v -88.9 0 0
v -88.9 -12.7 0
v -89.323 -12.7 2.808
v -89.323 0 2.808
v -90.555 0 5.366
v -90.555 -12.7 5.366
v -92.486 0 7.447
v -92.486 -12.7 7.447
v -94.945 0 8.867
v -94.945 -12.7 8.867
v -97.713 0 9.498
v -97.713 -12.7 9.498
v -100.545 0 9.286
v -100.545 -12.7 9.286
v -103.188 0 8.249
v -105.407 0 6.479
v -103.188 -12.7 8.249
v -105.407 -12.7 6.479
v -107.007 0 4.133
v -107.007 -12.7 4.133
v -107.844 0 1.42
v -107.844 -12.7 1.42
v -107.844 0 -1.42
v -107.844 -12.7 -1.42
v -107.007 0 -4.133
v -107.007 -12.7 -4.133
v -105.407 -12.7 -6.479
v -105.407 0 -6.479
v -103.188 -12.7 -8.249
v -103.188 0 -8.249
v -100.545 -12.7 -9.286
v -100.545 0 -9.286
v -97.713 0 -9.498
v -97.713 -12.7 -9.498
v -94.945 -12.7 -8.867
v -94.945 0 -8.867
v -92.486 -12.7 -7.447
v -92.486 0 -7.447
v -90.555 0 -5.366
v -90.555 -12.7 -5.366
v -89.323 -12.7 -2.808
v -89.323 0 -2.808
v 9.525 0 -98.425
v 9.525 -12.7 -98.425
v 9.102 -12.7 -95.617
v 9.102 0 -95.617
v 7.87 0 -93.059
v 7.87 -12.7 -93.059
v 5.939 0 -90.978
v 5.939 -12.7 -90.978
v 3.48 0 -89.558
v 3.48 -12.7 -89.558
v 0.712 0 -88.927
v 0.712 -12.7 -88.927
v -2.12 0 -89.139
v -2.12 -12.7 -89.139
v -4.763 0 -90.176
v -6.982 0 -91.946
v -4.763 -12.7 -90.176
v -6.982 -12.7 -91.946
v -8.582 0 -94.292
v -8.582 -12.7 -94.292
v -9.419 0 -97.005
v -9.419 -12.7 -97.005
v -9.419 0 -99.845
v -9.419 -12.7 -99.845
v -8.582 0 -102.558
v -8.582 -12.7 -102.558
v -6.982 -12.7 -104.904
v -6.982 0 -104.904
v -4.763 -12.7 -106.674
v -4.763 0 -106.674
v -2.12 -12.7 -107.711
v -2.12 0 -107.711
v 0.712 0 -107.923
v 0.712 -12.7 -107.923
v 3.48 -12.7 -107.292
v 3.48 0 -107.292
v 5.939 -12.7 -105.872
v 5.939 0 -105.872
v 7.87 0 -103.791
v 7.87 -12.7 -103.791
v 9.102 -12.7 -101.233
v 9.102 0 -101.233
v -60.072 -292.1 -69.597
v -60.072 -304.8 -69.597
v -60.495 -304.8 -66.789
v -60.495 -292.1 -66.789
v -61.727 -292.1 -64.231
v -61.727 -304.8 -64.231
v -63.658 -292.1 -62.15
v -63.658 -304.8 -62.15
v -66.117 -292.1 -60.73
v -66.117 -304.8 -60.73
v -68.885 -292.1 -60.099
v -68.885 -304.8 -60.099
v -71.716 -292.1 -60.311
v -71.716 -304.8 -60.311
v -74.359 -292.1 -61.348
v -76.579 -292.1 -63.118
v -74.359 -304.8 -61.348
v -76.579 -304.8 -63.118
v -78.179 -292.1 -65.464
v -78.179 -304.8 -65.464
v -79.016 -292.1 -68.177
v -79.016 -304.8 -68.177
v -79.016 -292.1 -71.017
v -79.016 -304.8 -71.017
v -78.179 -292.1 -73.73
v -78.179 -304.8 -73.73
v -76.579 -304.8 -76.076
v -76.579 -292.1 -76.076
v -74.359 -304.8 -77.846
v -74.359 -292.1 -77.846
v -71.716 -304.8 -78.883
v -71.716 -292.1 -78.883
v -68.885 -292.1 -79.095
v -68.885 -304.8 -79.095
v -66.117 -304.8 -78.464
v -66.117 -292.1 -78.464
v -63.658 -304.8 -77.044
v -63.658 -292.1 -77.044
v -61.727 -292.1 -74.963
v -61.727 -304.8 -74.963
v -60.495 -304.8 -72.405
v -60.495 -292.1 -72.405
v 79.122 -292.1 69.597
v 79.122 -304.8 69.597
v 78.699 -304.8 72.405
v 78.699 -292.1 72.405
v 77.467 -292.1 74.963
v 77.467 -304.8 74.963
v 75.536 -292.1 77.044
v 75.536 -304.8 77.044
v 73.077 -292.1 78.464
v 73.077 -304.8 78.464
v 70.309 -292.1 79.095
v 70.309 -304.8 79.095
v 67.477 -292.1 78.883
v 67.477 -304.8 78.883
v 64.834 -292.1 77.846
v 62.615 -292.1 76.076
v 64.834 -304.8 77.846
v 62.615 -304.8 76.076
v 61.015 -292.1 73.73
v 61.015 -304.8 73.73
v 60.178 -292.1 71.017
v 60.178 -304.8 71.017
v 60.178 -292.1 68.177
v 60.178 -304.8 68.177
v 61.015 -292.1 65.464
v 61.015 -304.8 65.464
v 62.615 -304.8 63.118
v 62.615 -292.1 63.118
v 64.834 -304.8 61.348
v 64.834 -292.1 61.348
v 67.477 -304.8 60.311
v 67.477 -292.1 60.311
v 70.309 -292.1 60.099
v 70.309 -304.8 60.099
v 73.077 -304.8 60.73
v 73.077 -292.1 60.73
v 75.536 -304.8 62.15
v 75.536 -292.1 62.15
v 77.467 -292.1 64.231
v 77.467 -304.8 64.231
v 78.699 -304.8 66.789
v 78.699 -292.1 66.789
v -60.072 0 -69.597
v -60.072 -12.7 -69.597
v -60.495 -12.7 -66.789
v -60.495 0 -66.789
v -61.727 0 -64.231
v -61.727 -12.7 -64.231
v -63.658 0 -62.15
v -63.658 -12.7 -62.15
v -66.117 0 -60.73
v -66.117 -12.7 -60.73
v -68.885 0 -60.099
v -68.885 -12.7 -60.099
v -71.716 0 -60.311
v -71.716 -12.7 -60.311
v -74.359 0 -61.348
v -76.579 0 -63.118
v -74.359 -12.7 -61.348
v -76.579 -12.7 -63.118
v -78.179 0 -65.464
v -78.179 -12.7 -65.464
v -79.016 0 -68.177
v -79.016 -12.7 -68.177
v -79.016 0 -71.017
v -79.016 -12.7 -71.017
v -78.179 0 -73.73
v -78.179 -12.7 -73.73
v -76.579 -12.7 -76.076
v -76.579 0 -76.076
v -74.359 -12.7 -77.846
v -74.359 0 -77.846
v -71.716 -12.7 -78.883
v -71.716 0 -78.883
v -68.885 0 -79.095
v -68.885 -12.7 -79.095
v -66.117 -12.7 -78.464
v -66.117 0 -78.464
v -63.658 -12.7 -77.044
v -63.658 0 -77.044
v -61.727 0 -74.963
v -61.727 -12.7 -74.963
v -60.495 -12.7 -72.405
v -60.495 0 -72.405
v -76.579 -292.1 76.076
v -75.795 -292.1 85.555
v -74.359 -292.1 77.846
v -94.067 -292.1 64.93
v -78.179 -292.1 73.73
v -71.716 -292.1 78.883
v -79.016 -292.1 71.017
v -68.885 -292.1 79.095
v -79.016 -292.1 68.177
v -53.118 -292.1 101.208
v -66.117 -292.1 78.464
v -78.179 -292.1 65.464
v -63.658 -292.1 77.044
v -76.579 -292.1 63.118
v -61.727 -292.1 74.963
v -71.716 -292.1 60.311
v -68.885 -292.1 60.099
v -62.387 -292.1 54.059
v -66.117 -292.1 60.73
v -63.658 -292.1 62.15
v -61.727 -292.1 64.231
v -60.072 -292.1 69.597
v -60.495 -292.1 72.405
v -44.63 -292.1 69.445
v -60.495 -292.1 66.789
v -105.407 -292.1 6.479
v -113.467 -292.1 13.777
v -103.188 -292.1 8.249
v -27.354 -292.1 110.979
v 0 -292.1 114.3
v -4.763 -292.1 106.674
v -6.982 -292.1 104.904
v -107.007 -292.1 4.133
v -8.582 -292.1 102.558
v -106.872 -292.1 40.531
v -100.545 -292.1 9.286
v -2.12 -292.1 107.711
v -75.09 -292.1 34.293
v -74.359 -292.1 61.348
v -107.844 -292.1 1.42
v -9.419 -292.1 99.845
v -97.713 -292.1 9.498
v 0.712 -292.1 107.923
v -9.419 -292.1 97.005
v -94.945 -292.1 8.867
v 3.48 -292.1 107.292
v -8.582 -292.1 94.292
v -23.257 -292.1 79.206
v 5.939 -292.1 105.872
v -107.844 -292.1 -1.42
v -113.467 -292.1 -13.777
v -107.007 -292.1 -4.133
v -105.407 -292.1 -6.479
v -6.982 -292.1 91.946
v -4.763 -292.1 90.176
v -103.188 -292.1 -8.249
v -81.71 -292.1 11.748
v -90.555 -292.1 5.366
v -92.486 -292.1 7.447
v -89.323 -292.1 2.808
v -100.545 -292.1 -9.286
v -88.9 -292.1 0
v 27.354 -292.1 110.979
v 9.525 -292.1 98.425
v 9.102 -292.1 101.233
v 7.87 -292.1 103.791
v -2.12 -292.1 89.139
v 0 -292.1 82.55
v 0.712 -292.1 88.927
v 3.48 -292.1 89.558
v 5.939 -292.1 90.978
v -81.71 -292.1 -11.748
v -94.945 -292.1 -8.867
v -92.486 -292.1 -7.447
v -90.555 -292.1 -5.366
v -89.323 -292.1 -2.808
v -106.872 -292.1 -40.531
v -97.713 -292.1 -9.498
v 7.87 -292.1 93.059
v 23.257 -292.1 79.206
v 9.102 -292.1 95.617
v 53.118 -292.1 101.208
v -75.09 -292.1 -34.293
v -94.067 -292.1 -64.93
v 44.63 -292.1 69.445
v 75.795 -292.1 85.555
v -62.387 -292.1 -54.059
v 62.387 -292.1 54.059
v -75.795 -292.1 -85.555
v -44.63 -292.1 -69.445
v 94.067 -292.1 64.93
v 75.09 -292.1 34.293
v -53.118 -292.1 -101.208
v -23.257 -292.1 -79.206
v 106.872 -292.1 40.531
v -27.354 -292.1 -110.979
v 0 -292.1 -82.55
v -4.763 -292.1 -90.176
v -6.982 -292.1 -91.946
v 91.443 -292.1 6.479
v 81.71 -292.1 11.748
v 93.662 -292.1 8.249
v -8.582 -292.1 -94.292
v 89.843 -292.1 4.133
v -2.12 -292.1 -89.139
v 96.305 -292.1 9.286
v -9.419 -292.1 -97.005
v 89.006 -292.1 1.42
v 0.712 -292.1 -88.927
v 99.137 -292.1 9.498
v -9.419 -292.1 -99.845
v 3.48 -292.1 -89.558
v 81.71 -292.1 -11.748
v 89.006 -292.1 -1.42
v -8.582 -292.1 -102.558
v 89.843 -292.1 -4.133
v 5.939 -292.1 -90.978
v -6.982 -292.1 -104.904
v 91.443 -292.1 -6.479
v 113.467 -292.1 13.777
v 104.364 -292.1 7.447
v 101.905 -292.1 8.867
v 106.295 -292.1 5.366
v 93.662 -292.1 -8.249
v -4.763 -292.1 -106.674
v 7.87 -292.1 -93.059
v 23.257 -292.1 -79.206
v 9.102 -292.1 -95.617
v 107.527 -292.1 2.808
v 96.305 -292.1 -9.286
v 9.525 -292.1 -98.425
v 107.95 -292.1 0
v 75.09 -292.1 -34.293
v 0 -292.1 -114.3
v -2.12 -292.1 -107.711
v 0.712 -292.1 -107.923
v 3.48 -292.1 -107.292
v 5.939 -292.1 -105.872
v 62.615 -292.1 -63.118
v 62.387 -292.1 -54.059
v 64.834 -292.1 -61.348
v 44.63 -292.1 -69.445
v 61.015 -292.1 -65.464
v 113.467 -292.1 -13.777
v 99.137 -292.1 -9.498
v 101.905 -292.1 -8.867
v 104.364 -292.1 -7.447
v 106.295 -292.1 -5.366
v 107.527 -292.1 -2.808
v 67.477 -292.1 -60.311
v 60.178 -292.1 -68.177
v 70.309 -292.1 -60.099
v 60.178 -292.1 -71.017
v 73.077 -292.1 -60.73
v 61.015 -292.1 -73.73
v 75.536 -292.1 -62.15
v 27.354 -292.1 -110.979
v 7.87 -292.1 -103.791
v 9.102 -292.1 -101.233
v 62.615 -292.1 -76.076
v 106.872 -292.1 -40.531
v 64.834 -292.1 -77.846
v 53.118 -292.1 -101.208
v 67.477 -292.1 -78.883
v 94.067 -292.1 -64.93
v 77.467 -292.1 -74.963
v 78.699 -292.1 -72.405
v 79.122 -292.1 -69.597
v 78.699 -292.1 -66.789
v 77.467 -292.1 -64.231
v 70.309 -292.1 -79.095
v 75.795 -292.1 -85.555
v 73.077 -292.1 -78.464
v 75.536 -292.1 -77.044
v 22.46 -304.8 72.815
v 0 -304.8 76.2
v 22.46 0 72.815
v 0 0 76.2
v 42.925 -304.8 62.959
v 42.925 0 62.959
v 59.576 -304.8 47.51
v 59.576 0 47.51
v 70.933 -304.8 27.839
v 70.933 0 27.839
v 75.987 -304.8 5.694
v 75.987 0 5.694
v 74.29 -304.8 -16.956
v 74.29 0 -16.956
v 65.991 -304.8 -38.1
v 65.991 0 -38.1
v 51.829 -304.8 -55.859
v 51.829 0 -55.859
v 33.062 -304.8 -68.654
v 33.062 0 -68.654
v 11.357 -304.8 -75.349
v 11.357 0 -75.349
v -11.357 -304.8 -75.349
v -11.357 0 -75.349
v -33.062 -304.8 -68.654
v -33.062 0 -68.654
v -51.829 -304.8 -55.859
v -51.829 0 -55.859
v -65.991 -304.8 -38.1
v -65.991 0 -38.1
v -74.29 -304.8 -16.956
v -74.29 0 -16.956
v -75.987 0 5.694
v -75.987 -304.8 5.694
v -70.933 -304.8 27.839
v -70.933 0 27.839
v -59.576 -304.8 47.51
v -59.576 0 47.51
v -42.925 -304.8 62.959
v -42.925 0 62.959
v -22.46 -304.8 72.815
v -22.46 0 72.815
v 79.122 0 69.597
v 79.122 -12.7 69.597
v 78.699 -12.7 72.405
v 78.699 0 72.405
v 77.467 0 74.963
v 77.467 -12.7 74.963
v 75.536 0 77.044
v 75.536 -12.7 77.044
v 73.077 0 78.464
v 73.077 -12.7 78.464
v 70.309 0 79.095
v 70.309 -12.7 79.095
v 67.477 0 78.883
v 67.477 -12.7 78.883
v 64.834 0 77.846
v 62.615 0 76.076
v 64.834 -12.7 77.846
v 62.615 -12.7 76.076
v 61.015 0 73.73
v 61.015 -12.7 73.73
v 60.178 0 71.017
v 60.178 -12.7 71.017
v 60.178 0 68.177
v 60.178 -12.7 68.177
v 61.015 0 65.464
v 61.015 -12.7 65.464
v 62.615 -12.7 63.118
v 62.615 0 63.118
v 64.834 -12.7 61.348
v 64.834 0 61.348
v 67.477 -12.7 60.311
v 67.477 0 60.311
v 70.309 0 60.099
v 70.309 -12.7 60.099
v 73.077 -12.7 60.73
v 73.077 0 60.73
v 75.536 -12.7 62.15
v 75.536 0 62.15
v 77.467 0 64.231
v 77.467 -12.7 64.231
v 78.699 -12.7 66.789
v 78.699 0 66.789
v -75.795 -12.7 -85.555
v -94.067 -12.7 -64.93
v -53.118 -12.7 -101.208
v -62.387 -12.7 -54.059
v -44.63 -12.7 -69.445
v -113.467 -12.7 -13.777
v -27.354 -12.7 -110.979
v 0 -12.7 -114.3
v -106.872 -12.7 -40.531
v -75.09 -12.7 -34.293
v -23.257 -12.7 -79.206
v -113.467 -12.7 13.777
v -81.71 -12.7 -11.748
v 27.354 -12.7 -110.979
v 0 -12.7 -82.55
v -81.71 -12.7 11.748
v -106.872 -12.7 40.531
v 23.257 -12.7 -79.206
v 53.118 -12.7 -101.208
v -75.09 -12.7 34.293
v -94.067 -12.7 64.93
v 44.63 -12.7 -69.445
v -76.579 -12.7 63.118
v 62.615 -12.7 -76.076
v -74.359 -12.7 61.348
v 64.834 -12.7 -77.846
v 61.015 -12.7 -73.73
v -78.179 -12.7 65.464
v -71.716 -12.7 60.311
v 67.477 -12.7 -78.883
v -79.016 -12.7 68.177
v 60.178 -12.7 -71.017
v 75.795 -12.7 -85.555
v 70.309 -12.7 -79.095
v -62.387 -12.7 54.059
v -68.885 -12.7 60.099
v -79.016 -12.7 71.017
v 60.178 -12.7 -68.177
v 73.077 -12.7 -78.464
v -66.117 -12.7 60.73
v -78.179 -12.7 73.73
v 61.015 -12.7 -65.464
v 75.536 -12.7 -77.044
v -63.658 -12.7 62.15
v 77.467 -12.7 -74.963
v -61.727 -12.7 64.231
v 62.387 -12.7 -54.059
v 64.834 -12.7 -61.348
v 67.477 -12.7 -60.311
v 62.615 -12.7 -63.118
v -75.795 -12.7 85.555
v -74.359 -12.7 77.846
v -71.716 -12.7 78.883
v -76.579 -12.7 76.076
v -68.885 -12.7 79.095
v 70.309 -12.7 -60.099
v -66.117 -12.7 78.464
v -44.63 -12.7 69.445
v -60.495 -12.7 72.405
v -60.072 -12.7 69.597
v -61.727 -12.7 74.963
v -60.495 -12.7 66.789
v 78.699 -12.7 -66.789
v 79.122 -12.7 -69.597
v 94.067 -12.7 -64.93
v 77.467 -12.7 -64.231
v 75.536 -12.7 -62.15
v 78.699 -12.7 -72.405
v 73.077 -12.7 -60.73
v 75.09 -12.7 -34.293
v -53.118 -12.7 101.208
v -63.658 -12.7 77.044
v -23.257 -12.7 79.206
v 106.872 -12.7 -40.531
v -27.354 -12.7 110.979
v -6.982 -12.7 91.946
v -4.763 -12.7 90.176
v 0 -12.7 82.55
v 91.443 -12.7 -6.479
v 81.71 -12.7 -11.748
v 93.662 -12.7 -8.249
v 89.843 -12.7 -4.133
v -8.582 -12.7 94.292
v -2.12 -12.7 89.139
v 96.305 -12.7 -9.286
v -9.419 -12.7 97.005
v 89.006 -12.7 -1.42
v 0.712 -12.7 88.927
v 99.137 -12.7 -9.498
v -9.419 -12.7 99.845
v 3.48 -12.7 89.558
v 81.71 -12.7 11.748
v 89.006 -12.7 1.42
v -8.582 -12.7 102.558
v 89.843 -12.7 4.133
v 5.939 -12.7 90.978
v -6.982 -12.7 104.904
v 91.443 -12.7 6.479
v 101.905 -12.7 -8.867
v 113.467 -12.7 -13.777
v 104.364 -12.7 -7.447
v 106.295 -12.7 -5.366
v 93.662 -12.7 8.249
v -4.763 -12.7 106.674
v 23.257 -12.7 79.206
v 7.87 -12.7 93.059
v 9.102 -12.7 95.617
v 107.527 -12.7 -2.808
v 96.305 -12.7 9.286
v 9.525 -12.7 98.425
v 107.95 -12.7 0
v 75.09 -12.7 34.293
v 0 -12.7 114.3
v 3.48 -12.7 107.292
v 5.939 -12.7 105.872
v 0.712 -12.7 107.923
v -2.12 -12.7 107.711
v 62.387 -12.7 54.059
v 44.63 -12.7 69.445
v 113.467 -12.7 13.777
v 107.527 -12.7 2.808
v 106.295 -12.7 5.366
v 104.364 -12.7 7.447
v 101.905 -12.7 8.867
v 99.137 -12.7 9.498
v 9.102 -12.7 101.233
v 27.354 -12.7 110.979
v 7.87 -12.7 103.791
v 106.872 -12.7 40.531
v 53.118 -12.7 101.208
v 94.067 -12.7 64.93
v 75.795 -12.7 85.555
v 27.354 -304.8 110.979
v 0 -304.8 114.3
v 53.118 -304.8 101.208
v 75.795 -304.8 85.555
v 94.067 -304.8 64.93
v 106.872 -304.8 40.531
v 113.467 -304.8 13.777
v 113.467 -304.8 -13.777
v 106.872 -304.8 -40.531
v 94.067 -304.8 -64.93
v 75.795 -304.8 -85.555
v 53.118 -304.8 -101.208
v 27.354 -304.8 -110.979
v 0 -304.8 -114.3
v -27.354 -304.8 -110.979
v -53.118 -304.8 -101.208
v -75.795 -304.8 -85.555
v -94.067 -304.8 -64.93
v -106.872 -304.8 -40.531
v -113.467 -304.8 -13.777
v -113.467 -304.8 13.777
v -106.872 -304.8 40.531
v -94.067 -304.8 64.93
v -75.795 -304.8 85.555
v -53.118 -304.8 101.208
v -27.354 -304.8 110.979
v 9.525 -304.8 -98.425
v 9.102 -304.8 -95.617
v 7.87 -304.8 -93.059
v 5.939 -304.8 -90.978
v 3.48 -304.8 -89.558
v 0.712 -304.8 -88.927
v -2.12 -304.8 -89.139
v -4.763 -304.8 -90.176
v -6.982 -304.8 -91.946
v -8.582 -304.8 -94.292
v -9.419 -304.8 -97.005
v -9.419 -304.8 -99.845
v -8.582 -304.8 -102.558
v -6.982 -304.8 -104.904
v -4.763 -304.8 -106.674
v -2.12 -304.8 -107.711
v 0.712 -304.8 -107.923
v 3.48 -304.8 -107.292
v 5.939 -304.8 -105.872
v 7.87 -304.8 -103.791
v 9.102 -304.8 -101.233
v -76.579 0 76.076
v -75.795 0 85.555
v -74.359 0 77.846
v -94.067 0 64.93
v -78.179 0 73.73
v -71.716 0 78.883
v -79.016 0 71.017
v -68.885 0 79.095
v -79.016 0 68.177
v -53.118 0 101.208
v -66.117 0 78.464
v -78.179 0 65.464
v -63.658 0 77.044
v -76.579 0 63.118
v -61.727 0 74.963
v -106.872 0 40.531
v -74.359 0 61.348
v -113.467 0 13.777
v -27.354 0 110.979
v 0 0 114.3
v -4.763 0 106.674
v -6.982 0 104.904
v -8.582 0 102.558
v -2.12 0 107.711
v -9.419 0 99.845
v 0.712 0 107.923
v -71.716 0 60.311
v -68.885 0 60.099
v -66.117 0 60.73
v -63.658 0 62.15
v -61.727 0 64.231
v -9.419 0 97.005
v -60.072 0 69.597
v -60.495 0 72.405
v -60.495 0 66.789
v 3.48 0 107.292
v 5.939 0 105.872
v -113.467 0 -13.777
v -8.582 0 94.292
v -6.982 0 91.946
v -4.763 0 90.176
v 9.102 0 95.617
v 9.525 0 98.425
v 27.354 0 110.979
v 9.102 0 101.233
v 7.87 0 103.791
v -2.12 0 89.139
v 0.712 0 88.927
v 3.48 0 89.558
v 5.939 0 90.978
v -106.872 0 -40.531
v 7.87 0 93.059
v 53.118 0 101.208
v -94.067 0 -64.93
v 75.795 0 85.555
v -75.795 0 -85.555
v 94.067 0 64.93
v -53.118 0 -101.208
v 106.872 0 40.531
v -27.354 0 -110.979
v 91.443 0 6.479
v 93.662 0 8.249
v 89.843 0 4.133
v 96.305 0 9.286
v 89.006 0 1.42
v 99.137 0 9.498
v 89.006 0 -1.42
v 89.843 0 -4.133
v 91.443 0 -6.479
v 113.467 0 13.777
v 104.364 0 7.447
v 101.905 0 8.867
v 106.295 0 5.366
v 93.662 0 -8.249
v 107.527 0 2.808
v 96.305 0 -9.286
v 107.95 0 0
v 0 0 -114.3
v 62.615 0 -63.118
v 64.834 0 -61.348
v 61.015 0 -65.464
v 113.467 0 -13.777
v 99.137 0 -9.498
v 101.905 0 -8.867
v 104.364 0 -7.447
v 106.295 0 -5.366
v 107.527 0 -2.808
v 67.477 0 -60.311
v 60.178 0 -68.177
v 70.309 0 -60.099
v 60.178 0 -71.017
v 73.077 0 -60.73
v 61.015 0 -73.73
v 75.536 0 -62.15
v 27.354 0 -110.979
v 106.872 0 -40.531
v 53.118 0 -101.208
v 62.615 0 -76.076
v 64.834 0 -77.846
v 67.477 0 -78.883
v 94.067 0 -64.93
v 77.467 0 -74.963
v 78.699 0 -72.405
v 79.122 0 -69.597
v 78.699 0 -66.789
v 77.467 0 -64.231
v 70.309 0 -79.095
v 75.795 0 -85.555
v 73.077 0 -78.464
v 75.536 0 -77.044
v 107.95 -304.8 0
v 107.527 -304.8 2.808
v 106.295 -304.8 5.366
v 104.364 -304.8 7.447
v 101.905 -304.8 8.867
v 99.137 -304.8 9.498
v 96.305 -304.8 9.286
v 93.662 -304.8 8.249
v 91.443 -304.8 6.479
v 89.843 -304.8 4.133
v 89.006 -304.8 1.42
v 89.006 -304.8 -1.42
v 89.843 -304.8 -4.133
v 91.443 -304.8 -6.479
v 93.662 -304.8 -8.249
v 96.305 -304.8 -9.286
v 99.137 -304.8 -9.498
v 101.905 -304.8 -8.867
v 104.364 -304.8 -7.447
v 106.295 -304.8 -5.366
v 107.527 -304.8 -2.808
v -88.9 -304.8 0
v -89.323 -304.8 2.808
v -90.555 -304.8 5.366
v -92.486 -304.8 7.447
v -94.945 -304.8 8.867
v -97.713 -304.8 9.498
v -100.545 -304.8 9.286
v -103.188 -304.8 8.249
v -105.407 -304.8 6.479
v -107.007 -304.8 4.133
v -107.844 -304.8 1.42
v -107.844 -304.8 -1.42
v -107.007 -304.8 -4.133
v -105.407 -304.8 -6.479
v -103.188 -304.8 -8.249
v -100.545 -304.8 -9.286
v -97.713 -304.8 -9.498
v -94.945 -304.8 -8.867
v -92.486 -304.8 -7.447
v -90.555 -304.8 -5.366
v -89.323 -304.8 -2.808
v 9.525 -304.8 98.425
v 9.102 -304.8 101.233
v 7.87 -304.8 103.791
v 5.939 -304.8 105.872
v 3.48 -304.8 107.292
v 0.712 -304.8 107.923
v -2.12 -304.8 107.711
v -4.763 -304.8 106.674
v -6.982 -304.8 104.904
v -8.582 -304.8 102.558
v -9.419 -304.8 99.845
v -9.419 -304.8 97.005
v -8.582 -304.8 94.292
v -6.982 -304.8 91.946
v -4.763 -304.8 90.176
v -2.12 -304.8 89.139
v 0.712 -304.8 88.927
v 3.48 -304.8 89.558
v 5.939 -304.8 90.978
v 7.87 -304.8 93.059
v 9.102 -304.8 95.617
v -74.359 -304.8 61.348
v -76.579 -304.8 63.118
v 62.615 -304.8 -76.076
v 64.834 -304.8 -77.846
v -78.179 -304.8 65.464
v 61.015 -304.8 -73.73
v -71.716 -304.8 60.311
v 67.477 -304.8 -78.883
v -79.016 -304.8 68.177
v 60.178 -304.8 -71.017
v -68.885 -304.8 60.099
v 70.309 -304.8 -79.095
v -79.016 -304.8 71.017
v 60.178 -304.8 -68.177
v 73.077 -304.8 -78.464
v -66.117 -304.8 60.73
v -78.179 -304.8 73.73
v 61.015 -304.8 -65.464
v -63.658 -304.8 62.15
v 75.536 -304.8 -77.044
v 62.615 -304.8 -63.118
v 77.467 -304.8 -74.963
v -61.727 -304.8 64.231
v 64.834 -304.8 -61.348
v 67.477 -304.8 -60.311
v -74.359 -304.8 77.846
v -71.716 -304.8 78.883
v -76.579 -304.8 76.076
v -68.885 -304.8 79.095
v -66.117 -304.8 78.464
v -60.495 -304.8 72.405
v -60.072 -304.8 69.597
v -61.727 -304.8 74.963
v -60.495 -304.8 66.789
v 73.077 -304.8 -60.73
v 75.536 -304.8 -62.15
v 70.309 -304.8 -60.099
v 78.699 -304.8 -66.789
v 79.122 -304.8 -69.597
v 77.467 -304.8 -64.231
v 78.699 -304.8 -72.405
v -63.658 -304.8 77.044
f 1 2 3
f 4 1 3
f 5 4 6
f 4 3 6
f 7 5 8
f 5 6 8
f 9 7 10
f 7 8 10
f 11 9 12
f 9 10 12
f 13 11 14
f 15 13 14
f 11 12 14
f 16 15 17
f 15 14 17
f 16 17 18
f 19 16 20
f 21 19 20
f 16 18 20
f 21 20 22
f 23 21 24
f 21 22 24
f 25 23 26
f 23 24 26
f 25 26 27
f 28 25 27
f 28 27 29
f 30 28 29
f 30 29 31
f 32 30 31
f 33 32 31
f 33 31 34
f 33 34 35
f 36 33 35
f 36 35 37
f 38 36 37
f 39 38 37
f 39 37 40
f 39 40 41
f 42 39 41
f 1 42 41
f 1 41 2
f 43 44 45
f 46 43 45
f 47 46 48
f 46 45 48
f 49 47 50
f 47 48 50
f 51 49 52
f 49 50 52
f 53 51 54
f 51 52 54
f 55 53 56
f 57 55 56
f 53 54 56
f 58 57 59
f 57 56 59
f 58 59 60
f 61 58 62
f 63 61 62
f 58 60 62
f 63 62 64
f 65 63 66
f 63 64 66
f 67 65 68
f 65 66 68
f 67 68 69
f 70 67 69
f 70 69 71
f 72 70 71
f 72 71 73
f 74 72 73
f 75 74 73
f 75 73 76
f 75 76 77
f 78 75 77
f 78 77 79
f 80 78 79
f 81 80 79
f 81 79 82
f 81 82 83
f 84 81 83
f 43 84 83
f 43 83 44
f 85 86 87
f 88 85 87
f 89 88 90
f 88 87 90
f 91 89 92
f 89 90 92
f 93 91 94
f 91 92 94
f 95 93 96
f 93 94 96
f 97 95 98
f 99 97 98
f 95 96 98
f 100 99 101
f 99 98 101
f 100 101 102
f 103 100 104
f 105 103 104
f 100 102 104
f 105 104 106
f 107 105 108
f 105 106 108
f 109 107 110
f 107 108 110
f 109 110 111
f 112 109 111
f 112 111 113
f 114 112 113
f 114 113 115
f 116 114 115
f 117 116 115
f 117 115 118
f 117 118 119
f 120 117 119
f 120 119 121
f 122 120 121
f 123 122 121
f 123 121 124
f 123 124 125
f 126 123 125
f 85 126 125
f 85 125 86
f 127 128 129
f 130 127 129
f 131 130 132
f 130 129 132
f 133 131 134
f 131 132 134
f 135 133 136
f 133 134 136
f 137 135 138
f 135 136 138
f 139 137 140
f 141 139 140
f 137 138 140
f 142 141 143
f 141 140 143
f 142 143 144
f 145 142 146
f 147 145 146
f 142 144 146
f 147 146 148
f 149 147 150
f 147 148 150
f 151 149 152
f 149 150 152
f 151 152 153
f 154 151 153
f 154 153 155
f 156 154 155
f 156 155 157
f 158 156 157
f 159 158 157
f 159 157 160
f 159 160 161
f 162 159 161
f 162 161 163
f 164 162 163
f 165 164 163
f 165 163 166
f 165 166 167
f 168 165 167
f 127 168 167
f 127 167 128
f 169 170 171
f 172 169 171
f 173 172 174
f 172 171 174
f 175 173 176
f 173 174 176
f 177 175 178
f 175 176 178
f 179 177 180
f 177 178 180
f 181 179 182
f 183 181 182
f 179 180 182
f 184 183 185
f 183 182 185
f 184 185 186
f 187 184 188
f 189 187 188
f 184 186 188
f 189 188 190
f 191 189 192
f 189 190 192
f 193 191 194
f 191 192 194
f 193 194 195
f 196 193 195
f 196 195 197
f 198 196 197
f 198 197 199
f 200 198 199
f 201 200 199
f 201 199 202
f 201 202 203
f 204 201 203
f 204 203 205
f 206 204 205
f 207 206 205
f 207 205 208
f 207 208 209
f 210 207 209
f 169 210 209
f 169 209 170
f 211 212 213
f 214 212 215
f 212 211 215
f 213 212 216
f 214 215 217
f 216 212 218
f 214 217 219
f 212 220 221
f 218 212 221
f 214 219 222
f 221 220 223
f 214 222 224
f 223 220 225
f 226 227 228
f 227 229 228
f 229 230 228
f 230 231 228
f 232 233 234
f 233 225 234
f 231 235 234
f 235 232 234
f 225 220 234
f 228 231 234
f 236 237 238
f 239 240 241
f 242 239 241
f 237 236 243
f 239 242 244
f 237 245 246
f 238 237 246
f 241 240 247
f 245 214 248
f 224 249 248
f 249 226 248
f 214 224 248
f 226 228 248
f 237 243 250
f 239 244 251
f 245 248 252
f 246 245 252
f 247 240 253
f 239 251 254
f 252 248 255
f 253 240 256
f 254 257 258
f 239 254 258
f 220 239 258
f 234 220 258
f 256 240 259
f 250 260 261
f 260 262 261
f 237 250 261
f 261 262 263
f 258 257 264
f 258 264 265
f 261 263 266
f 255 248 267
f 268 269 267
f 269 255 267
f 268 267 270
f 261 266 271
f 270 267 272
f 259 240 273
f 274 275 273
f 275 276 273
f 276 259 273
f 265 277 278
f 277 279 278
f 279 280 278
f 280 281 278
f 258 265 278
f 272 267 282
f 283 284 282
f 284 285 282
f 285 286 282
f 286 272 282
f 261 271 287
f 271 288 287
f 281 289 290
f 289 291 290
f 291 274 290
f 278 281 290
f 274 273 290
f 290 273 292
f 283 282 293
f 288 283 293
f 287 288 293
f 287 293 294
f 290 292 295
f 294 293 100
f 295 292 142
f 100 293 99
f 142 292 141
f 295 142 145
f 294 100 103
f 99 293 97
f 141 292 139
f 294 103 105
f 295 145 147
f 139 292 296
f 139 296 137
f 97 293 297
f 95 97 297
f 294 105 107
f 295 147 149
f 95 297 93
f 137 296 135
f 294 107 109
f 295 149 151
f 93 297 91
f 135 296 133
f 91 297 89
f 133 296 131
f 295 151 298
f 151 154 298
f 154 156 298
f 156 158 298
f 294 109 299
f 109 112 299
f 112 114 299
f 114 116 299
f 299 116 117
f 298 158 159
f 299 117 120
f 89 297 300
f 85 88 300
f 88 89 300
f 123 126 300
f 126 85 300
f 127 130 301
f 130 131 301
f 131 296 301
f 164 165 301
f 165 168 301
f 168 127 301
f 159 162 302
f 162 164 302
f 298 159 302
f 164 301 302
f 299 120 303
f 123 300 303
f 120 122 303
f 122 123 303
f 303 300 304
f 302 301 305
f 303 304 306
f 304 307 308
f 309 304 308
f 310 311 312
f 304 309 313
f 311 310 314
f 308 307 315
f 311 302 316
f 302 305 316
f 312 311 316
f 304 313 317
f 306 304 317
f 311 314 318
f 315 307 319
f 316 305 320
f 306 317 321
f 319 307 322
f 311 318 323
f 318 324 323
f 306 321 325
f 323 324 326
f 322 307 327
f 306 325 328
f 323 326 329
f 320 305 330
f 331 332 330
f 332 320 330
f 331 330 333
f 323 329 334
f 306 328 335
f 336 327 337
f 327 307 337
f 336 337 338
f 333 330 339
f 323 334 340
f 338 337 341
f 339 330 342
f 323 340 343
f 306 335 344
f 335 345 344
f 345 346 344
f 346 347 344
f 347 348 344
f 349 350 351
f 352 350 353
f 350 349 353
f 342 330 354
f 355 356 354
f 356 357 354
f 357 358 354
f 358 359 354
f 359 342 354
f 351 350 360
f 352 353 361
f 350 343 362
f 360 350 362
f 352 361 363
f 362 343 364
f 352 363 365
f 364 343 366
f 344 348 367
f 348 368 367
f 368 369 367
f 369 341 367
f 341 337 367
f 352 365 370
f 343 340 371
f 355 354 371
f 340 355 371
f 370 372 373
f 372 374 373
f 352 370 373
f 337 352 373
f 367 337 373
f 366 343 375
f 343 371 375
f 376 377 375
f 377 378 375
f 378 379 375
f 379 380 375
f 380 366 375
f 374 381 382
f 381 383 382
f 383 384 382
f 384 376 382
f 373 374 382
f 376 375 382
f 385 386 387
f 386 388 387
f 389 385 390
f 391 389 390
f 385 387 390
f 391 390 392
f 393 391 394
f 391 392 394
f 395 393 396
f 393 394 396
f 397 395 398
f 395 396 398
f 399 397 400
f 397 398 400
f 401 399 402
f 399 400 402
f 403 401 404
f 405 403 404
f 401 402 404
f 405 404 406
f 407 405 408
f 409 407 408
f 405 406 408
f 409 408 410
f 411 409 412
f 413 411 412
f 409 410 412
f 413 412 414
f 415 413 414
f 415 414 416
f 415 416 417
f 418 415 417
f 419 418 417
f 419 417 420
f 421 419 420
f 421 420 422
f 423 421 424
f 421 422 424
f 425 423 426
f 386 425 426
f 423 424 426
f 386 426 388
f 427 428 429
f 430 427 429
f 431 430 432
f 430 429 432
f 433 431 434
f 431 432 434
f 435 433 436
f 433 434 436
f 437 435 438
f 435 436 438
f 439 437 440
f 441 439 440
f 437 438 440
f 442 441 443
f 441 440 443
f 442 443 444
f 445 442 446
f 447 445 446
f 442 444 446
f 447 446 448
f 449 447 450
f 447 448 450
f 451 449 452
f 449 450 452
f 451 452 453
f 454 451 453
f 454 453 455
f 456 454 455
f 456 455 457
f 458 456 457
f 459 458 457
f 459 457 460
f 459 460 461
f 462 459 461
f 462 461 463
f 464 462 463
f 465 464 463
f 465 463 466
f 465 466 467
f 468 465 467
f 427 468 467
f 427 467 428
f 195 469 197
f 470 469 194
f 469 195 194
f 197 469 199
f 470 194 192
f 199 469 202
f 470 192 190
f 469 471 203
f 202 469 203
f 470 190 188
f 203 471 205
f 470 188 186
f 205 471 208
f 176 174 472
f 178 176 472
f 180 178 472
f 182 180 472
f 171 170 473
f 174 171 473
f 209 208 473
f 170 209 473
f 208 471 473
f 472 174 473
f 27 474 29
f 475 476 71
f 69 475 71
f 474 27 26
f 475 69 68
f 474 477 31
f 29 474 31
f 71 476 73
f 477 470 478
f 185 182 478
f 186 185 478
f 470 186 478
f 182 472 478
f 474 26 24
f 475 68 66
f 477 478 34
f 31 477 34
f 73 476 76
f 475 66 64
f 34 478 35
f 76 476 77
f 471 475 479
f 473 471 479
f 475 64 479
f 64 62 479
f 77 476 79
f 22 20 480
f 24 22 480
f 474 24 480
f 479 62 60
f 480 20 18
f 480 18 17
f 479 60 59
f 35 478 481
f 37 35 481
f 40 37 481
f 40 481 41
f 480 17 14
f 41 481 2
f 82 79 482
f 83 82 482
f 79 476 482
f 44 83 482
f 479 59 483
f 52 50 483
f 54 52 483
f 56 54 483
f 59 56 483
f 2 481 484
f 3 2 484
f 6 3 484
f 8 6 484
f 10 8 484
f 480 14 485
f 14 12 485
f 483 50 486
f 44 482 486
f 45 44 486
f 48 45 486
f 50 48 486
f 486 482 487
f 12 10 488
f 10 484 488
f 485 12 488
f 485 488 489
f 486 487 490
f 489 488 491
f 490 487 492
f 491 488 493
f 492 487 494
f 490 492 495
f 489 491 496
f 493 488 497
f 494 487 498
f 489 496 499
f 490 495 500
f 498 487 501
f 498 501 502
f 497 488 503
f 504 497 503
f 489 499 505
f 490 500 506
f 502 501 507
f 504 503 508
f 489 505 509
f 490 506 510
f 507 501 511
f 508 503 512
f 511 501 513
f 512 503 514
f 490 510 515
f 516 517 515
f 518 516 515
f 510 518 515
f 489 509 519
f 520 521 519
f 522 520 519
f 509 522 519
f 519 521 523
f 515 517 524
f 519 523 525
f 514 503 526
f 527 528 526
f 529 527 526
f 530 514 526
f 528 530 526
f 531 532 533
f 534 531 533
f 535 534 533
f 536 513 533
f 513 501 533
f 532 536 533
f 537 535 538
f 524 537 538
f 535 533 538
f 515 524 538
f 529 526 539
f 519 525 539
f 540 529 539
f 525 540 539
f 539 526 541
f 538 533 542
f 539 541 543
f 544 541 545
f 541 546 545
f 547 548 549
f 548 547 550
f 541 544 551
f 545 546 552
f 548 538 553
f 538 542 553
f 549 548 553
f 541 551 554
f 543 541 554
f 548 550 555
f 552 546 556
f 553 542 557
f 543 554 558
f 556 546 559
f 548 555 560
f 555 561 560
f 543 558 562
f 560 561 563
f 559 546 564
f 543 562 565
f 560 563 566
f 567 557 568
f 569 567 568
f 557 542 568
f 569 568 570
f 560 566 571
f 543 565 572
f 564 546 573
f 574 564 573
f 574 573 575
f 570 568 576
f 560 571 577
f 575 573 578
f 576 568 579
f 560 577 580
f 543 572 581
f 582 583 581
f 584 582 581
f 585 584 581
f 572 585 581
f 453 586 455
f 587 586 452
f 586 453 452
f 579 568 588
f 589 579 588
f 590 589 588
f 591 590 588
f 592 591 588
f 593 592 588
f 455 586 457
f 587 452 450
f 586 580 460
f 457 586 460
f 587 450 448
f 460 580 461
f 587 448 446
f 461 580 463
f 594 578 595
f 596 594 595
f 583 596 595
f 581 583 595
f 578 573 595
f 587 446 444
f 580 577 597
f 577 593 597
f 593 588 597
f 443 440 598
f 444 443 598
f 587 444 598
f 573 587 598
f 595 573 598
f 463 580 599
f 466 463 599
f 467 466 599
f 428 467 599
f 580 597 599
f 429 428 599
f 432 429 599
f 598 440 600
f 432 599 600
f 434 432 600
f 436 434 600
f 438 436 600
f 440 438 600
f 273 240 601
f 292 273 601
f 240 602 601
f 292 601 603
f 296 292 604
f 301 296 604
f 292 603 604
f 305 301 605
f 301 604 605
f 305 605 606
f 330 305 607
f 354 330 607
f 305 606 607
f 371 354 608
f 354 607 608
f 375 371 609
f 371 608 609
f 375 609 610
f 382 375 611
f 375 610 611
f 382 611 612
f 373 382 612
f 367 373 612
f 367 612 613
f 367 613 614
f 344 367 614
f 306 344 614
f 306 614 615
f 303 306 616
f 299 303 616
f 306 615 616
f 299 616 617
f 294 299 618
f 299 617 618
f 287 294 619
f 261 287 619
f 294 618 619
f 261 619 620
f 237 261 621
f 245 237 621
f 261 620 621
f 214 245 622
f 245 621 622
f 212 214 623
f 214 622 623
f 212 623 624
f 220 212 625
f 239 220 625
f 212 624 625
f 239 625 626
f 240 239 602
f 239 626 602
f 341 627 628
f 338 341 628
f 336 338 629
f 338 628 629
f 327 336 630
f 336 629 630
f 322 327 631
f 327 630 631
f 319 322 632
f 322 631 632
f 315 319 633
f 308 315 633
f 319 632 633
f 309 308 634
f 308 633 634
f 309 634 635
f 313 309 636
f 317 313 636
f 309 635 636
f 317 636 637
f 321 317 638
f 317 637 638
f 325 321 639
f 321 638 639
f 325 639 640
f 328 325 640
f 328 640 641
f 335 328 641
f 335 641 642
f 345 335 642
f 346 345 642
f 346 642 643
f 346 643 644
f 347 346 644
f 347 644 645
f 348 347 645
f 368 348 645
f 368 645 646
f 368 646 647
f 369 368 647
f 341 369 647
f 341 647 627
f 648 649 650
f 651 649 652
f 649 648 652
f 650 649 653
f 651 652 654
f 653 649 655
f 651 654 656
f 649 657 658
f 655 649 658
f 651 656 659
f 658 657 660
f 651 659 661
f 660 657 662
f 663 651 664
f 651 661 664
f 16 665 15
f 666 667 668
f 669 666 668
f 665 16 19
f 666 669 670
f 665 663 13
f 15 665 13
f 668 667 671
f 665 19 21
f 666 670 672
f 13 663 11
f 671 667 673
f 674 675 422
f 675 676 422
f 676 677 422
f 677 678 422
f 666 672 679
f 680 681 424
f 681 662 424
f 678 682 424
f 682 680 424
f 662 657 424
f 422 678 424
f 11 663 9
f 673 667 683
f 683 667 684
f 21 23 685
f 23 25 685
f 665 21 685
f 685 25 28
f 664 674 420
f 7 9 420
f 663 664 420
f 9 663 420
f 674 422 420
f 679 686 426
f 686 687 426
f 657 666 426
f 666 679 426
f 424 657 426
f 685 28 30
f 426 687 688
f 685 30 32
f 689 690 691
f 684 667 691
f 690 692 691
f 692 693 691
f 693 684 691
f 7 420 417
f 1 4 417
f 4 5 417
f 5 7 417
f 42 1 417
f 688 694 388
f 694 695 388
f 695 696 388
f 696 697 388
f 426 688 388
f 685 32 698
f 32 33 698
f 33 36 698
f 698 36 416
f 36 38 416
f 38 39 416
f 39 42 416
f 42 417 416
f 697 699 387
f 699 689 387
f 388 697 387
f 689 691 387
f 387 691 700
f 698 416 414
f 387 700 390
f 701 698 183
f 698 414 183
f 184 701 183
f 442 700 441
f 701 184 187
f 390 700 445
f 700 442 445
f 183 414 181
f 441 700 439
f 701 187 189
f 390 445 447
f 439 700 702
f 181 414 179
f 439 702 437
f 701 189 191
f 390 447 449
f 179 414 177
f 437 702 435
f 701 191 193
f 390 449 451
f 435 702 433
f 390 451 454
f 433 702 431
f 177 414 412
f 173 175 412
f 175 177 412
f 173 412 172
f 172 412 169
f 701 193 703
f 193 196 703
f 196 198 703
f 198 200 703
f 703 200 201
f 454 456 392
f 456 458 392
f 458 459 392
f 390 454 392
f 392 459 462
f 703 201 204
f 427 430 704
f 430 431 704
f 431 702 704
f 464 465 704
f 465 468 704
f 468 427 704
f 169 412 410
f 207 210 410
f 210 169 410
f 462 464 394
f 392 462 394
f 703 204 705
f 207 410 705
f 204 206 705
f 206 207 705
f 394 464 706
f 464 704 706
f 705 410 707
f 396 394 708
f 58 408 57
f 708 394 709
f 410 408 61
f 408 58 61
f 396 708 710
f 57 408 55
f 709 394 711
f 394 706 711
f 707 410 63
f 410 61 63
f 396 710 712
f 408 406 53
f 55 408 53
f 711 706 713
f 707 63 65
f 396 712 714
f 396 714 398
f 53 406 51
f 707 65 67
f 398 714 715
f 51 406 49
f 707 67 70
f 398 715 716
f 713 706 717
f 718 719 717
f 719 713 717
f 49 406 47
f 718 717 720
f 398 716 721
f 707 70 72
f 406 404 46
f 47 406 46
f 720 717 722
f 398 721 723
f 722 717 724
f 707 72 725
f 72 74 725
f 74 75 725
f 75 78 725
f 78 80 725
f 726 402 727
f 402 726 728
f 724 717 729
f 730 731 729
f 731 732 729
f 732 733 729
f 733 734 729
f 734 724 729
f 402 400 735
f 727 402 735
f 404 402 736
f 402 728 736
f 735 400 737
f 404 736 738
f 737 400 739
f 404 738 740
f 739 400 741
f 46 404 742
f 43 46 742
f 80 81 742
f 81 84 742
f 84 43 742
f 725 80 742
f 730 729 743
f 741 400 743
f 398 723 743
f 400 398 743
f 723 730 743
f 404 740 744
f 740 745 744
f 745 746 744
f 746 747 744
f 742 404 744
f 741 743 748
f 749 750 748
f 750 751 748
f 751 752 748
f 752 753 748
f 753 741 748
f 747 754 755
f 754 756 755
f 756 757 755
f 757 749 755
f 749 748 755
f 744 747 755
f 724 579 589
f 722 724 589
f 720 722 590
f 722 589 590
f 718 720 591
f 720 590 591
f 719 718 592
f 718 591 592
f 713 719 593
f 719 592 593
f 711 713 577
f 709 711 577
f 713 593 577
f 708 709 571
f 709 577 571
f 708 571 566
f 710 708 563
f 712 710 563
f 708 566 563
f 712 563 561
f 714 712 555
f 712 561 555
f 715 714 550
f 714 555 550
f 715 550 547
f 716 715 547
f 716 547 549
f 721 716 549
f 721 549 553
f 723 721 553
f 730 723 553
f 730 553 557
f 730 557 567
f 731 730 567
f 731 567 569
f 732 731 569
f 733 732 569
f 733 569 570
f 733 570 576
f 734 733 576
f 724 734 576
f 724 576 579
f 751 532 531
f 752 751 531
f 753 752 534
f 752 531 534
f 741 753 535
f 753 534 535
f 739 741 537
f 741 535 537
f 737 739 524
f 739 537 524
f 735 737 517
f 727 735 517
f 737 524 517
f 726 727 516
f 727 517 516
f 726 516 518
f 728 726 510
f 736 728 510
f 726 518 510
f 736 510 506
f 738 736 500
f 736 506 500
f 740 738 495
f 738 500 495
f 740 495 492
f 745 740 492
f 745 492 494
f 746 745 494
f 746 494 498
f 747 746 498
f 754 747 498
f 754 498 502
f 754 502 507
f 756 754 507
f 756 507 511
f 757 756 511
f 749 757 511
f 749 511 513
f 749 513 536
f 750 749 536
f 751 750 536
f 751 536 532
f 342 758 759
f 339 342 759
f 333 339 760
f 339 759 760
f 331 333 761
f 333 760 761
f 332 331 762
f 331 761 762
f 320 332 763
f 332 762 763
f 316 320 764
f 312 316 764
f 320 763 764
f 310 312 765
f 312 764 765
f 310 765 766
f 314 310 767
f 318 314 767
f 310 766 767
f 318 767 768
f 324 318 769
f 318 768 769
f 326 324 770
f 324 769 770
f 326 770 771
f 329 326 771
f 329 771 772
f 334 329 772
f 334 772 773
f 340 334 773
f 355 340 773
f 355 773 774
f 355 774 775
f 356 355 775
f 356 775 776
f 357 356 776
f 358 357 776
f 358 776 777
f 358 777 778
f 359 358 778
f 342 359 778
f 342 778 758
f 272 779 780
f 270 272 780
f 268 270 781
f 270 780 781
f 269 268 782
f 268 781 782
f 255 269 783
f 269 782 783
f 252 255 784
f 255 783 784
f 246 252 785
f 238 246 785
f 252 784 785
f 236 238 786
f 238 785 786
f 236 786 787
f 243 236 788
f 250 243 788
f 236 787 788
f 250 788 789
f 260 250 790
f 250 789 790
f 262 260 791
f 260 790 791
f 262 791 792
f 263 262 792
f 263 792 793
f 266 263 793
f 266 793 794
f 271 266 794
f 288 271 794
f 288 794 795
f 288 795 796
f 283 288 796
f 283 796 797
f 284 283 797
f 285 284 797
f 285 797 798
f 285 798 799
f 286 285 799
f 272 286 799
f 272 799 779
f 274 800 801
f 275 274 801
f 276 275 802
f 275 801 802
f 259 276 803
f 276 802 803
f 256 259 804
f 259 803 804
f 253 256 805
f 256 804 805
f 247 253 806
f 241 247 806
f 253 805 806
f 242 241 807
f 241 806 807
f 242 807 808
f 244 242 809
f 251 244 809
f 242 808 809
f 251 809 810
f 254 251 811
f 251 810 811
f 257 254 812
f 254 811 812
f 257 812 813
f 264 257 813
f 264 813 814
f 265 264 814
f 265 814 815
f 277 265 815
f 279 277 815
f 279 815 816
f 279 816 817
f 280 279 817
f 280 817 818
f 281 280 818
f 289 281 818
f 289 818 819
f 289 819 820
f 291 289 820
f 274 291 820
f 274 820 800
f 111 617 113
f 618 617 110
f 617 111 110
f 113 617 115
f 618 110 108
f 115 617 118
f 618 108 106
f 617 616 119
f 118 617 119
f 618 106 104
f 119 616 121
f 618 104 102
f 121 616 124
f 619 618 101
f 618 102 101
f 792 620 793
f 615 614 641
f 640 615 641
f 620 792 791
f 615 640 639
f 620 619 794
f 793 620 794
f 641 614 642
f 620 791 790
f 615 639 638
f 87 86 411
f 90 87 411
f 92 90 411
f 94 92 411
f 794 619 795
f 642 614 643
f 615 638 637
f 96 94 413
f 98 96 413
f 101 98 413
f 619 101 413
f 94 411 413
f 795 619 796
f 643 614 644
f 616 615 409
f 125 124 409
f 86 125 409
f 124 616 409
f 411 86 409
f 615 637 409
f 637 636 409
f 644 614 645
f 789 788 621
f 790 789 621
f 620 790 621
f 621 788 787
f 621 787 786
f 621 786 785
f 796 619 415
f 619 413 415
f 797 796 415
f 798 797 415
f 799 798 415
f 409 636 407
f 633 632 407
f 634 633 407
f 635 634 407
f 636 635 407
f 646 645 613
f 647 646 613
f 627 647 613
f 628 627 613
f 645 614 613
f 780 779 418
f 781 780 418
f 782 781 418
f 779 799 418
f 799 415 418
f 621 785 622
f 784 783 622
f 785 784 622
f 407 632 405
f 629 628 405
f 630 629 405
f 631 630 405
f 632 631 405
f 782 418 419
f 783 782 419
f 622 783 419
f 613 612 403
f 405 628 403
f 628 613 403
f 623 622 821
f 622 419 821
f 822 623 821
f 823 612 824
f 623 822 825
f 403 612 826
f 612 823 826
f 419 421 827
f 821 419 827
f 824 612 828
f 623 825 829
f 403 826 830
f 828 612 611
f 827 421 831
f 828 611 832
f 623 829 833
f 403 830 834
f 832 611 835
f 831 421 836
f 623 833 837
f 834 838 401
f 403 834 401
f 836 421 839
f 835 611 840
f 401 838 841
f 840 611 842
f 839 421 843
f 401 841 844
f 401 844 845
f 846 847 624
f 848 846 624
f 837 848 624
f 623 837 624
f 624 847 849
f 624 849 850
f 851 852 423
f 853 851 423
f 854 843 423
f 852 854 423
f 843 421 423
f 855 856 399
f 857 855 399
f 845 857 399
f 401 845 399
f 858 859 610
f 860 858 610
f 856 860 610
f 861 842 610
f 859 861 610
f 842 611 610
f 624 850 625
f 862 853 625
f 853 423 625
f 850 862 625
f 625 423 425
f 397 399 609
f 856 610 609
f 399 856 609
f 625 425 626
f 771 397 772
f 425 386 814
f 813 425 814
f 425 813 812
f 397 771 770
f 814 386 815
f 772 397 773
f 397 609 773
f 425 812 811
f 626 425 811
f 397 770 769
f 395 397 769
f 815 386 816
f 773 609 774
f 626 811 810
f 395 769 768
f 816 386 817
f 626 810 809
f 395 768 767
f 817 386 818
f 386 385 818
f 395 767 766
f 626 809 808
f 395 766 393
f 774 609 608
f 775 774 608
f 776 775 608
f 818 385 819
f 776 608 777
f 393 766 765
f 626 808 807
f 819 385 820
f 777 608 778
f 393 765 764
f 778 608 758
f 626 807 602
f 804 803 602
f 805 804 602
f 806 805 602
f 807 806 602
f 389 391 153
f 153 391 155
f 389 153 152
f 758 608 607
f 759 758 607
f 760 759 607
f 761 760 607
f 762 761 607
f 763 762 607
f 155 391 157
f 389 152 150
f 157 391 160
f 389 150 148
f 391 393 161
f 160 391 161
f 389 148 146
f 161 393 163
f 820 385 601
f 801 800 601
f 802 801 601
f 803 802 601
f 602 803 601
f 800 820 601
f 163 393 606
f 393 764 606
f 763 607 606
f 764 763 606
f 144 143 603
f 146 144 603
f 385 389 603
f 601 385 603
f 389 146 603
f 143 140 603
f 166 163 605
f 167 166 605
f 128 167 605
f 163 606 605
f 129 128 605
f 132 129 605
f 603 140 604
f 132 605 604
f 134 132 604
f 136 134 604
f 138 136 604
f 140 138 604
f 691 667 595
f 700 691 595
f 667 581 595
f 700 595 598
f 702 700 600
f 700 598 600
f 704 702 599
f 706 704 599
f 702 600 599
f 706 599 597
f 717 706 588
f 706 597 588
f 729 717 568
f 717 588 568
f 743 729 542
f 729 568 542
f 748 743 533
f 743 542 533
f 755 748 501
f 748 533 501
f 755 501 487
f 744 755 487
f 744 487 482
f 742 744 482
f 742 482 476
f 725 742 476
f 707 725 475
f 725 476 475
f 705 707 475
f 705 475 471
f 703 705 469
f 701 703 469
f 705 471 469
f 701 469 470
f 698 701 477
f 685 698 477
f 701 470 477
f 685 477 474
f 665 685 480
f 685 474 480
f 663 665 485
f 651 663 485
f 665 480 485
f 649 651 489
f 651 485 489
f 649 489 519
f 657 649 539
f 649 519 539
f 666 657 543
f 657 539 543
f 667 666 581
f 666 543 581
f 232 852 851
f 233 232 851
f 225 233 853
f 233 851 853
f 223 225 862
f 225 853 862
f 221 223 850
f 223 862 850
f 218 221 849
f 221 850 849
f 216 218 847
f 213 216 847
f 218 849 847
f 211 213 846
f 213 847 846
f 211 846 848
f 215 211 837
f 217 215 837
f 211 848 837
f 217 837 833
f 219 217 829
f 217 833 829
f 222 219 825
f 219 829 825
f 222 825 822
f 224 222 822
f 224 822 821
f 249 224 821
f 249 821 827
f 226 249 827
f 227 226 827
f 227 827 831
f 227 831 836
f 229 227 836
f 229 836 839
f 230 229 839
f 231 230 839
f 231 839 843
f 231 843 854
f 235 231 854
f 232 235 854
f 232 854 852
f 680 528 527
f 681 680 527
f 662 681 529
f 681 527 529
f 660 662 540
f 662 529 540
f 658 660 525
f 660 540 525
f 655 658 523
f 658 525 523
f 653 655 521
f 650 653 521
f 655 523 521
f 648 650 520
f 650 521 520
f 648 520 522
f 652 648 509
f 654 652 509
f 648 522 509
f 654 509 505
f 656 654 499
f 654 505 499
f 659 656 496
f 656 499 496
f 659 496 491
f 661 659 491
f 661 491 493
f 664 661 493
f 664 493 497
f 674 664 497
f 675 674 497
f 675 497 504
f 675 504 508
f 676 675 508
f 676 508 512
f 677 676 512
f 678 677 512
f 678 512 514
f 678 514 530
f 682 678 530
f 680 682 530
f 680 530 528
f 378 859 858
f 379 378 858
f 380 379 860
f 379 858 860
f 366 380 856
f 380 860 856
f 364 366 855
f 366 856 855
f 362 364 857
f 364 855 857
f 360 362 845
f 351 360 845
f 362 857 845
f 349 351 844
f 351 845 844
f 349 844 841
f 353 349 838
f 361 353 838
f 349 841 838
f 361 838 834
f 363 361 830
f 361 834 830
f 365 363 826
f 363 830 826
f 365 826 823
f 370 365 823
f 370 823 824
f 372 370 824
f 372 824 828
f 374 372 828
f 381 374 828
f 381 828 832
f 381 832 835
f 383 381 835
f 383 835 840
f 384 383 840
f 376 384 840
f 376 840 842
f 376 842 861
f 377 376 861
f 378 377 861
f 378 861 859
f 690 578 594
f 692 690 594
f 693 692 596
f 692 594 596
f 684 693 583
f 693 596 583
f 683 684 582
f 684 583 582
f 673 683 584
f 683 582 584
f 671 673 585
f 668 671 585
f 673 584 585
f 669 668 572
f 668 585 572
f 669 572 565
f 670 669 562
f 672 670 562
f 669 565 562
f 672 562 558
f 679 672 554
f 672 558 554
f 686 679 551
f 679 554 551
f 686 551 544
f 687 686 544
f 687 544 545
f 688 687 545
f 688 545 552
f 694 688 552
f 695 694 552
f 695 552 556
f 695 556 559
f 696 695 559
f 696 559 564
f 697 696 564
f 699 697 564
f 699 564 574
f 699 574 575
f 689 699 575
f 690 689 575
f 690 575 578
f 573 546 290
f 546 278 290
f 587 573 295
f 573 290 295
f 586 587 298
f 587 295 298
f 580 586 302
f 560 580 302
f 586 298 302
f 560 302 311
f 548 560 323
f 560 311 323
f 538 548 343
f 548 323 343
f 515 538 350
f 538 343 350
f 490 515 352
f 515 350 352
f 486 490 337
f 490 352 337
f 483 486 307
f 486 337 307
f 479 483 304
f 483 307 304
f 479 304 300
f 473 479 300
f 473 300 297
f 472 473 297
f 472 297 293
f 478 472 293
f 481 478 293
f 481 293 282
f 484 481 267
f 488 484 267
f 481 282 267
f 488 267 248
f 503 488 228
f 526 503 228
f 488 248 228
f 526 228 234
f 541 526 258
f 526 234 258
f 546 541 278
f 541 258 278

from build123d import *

# Parameters (mm, degrees)
F3_R     = 9.525
F4_DEPTH = 304.801


with BuildPart() as f1:
    # F0 (on Right) → F1 (revolve)
    with BuildSketch(Plane.YZ):
        Polygon((0, 76.2), (0, 114.3), (-12.7, 114.3), (-12.7, 82.55), (-292.1, 82.55), (-292.1, 114.3), (-304.8, 114.3), (-304.8, 76.2), align=None)
    revolve(axis=Axis((0, 69.986956, 0), (0, 1, 0)))

    # F3 (on offset) → F4 (cut, through all)
    with BuildSketch(Plane.XZ.offset(304.8)):
        with Locations((0, 98.425)):
            Circle(F3_R)
        with Locations((-69.596985, 69.596985)):
            Circle(F3_R)
        with Locations((-98.425, 0)):
            Circle(F3_R)
        with Locations((-69.596985, -69.596985)):
            Circle(F3_R)
        with Locations((0, -98.425)):
            Circle(F3_R)
        with Locations((69.596985, -69.596985)):
            Circle(F3_R)
        with Locations((98.425, 0)):
            Circle(F3_R)
        with Locations((69.596985, 69.596985)):
            Circle(F3_R)
    extrude(amount=-F4_DEPTH, mode=Mode.SUBTRACT)


solid = f1.part
